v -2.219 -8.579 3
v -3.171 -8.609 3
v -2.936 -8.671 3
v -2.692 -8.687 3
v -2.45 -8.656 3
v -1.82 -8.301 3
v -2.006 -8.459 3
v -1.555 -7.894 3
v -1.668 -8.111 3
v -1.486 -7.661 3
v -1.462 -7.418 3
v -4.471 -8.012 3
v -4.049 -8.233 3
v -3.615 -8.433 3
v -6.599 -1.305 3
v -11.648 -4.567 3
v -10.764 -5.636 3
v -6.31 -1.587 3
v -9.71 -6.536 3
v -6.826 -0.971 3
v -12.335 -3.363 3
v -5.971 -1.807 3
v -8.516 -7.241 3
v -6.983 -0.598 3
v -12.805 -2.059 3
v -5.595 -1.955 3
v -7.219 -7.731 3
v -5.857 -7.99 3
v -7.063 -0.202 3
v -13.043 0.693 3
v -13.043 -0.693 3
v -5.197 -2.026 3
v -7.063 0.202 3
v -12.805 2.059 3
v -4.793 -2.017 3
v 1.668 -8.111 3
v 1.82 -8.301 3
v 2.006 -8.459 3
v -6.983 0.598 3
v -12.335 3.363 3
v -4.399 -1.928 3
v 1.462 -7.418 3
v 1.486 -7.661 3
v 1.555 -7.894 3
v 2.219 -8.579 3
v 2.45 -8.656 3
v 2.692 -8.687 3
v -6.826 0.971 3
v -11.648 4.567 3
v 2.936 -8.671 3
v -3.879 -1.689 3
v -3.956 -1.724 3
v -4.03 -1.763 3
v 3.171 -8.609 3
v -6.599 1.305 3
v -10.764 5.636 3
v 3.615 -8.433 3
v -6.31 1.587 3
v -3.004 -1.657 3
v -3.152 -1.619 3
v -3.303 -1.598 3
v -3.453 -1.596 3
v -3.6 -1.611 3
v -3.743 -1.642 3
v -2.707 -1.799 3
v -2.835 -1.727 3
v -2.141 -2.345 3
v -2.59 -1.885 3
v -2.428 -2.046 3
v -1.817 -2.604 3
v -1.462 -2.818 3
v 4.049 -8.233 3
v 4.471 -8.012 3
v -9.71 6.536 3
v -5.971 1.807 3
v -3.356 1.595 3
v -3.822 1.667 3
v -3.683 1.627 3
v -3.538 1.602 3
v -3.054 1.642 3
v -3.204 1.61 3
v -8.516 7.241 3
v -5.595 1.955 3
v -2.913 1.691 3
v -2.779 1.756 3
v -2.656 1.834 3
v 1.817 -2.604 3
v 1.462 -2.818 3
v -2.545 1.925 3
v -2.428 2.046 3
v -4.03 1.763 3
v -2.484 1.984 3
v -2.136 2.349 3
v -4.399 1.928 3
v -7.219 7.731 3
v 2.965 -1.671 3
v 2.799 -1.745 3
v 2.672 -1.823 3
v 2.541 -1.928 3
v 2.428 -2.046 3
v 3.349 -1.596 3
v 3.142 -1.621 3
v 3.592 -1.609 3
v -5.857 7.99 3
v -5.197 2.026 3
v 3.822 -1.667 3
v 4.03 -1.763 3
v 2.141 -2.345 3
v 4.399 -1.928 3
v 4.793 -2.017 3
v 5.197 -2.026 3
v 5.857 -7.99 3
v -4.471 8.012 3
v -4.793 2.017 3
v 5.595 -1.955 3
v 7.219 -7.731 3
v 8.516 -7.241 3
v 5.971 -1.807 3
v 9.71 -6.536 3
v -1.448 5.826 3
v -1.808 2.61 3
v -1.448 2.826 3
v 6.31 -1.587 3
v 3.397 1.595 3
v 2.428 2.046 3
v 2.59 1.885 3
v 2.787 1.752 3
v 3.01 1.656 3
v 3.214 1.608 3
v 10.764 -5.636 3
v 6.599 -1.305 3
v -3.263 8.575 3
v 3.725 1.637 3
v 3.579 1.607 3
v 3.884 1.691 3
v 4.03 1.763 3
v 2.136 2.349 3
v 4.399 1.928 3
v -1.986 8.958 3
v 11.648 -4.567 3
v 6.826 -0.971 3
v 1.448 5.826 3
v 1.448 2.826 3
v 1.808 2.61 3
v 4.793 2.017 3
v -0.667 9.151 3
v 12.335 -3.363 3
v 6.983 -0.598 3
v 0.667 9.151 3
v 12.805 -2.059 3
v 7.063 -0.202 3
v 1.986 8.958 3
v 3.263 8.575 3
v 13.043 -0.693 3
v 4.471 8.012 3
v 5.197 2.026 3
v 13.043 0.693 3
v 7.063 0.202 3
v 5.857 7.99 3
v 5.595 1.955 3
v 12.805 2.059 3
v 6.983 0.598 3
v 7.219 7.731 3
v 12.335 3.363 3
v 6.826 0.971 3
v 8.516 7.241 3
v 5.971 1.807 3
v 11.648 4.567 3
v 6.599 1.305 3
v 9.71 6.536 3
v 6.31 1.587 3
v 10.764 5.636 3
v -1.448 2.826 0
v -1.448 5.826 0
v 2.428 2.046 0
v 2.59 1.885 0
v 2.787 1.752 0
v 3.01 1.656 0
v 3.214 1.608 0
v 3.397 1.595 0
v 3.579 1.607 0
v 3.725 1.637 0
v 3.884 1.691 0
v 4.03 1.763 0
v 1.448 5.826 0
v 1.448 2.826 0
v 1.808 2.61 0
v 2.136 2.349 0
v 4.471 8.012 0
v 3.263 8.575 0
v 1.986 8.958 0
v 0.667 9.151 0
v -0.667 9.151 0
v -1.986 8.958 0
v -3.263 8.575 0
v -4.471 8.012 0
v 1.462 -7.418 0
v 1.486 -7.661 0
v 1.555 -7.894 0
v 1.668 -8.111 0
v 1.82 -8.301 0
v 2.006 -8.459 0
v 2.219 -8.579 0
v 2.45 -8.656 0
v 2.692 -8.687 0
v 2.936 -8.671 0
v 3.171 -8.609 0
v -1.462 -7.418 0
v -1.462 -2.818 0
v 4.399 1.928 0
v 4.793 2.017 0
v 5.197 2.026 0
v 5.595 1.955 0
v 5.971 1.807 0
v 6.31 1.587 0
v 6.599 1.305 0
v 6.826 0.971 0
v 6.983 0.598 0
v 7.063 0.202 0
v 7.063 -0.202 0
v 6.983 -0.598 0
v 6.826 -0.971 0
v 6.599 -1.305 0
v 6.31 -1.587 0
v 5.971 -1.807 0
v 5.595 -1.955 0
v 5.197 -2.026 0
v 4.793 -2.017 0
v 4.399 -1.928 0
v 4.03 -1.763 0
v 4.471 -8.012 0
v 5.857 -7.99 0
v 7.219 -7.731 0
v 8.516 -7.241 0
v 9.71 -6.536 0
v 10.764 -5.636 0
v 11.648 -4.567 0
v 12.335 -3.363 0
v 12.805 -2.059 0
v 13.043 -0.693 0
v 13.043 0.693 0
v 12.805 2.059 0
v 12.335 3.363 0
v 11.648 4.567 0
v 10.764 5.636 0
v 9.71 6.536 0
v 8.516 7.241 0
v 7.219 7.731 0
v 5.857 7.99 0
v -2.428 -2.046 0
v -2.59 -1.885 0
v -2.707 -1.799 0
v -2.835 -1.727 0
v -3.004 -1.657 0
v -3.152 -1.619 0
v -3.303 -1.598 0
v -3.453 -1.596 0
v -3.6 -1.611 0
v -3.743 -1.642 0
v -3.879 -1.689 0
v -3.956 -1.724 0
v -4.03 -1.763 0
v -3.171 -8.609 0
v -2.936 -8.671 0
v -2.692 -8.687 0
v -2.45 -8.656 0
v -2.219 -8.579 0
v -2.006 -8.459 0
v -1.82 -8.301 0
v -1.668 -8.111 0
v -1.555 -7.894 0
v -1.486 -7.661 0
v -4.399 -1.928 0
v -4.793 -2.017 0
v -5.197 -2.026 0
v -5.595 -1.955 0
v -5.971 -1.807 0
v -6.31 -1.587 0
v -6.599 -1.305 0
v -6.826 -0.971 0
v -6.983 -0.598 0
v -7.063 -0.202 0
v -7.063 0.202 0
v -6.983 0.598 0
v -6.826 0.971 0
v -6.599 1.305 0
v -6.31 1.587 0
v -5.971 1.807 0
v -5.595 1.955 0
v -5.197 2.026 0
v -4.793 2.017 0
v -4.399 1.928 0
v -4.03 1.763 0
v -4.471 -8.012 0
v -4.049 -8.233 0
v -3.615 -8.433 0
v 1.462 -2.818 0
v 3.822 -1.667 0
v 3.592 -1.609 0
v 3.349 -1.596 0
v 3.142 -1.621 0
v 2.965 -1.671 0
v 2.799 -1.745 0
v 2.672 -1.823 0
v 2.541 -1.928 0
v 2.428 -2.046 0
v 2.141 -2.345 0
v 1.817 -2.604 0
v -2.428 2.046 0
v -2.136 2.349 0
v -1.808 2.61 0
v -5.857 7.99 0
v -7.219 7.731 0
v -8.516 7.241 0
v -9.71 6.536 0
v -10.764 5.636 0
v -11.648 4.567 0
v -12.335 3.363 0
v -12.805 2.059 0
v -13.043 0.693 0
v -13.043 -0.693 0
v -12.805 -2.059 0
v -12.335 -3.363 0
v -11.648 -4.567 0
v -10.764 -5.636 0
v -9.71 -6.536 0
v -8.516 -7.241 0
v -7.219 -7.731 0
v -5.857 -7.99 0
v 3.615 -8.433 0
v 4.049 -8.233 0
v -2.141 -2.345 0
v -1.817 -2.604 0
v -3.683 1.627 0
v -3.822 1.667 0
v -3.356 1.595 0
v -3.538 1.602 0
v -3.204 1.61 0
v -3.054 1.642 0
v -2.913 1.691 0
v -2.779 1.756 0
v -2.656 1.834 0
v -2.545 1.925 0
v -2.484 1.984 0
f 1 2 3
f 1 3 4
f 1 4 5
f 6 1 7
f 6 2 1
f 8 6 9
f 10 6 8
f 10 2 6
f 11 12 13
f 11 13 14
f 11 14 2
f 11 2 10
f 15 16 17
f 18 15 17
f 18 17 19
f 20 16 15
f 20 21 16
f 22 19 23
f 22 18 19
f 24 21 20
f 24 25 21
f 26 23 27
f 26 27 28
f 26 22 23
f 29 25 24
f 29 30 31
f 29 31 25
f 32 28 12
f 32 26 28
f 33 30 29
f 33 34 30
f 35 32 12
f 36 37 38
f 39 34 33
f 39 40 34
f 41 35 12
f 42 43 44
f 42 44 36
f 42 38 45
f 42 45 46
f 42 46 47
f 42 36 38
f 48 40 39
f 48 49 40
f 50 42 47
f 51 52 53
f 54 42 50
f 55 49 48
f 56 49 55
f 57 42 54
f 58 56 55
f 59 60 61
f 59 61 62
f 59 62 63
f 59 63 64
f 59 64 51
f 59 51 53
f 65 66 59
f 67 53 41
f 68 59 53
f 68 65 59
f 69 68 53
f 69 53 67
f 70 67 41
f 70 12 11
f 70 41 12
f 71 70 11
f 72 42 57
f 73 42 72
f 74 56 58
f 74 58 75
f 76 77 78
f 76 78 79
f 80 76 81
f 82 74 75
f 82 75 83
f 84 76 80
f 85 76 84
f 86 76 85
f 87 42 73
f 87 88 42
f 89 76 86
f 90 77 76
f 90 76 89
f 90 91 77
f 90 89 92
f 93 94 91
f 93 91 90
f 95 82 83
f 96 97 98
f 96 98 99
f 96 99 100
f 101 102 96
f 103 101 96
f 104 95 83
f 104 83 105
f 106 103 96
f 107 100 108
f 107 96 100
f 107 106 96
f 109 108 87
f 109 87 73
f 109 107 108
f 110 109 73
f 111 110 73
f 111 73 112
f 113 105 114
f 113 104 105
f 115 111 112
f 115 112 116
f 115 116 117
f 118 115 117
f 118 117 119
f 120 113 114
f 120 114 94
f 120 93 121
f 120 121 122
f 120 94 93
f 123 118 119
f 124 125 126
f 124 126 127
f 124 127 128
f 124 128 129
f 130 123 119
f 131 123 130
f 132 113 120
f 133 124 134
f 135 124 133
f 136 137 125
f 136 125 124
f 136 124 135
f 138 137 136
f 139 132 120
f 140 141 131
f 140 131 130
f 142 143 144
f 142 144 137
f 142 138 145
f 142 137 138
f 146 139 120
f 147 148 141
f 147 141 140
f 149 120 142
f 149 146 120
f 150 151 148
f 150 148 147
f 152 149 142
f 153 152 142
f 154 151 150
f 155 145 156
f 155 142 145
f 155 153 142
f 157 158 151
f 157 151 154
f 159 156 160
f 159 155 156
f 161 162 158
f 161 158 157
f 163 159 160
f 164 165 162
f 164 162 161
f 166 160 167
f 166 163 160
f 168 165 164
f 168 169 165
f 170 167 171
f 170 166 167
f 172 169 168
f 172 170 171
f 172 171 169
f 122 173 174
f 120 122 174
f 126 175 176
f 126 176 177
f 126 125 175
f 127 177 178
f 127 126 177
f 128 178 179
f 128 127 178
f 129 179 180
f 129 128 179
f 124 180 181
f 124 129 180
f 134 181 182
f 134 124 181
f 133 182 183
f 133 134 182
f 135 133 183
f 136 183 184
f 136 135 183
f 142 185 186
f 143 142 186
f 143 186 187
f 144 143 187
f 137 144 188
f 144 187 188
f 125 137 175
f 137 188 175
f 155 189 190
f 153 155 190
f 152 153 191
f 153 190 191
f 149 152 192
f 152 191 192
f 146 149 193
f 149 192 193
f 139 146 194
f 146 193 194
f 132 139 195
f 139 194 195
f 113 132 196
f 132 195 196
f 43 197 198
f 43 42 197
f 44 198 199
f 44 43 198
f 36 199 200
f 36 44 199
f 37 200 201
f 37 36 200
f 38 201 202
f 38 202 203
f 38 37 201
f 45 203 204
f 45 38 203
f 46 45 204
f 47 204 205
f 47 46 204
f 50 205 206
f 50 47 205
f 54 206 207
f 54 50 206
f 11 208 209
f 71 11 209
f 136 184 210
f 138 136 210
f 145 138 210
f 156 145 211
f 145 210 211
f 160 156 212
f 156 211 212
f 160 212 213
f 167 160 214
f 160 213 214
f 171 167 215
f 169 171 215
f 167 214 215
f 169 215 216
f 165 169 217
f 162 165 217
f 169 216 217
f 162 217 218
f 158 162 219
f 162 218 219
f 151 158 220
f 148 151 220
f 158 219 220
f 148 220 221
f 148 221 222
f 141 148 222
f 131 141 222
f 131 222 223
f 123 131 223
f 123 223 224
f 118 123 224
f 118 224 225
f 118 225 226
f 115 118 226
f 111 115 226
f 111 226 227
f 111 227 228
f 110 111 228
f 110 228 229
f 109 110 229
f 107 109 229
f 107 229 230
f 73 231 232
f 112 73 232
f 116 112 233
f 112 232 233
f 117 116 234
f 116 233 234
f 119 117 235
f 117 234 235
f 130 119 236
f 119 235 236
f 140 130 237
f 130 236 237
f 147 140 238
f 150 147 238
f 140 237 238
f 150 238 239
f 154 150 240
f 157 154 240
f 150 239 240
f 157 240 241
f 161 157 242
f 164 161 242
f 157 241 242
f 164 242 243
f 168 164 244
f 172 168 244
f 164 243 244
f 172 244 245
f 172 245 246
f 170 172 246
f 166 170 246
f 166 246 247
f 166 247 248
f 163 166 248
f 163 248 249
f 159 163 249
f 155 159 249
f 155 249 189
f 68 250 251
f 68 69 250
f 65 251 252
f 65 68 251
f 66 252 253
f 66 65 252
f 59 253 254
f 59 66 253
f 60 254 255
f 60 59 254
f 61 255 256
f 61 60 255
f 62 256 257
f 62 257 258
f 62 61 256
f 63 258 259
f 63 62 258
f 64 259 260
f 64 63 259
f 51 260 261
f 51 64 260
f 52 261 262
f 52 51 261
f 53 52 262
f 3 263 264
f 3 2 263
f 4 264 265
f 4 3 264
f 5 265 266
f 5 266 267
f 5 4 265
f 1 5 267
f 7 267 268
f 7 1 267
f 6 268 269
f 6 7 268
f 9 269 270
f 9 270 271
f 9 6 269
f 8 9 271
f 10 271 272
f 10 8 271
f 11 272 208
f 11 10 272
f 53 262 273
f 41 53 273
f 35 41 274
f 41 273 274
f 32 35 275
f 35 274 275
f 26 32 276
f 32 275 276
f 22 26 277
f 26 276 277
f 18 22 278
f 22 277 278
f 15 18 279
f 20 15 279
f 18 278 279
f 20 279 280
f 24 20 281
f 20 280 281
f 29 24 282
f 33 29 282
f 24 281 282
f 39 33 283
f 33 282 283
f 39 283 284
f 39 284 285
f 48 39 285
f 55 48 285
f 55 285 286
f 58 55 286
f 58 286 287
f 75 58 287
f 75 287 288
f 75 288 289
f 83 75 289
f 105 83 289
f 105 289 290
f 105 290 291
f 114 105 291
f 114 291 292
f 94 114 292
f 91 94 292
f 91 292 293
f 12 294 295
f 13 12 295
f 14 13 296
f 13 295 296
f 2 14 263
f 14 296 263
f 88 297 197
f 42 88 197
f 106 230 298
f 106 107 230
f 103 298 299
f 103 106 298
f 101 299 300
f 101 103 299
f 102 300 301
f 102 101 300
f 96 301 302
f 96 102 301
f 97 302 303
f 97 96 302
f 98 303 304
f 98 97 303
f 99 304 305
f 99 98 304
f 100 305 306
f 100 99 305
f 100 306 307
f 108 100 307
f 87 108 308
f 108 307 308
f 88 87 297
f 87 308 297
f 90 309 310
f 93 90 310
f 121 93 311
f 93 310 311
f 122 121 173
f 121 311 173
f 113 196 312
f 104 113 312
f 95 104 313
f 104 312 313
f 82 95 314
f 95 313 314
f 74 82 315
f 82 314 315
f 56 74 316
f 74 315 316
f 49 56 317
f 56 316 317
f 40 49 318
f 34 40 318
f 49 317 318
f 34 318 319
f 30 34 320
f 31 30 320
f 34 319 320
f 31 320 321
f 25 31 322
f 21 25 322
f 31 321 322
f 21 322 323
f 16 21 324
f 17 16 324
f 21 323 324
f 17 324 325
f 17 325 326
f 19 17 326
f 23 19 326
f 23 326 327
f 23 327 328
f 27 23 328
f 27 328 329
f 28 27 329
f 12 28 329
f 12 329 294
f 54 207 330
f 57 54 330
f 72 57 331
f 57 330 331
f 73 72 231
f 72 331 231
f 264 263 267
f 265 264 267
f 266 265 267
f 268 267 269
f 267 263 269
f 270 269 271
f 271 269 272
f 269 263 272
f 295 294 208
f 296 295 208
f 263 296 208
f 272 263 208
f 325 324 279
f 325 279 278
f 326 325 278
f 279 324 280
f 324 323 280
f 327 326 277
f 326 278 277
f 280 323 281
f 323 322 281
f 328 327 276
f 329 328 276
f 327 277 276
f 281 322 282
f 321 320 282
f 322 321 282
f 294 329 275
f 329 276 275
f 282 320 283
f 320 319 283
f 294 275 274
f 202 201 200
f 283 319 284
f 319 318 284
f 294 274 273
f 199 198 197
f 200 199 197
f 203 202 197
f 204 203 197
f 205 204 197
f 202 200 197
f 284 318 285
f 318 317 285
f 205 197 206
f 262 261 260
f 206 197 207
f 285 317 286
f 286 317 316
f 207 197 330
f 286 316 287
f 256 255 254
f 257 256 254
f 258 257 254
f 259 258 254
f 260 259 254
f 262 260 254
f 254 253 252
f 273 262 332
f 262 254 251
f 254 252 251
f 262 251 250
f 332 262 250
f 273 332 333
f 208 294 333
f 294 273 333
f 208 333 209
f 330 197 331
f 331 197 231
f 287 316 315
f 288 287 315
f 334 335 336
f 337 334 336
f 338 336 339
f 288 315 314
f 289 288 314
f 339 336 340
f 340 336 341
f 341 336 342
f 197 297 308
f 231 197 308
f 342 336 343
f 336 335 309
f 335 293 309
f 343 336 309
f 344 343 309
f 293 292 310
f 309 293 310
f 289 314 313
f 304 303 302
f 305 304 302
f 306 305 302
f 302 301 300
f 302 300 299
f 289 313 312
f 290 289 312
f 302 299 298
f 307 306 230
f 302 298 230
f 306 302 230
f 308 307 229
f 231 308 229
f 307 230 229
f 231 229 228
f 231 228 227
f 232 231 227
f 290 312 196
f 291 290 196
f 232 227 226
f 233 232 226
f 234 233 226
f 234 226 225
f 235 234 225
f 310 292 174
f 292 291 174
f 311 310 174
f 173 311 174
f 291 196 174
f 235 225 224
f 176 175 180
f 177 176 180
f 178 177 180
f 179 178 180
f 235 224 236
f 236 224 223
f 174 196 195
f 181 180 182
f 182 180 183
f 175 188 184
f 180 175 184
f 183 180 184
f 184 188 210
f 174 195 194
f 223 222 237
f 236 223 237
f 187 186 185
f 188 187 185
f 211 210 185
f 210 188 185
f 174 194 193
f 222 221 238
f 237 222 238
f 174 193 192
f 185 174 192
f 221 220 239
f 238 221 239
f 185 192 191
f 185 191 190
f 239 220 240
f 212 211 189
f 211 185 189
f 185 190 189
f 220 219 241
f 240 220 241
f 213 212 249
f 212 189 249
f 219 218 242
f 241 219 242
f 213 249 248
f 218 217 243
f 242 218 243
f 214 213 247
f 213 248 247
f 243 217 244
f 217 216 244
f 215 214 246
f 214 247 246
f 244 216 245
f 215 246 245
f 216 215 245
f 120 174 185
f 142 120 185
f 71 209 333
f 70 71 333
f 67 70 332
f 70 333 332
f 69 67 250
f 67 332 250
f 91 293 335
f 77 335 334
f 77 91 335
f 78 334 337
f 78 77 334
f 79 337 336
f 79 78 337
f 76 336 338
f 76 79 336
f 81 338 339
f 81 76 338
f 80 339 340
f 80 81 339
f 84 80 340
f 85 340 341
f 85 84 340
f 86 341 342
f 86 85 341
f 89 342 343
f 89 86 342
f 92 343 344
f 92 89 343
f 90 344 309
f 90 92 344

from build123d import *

# Parameters (mm, degrees)
EXTRUDE_1_DEPTH = 3
FILLET_1_R      = 1.27


with BuildPart() as part:
    # 스케치1 → 보스-돌출1 (new body)
    with BuildSketch(Plane.XY):
        with BuildLine():
            Line((-1.4475, 5.825839477), (1.4475, 5.825839477))
            Line((1.4475, 5.825839477), (1.4475, 2.825839477))
            ThreePointArc((1.4475, 2.825839477), (2.528752179, 1.919905575), (3.110851973, 0.635))
            ThreePointArc((3.110851973, 0.635), (7.073084861, 0), (3.110851973, -0.635))
            ThreePointArc((3.110851973, -0.635), (2.533845793, -1.913178115), (1.4625, -2.818105525))
            Line((1.4625, -2.818105525), (1.4625, -9.057688378))
            ThreePointArc((1.4625, -9.057688378), (3.012624602, -8.666297826), (4.471273428, -8.011762536))
            ThreePointArc((4.471273428, -8.011762536), (13.073084861, 0), (4.471273428, 8.011762536))
            ThreePointArc((4.471273428, 8.011762536), (0, 9.175), (-4.471273428, 8.011762536))
            ThreePointArc((-4.471273428, 8.011762536), (-13.073084861, 0), (-4.471273428, -8.011762536))
            ThreePointArc((-4.471273428, -8.011762536), (-3.012624602, -8.666297826), (-1.4625, -9.057688378))
            Line((-1.4625, -9.057688378), (-1.4625, -2.818105525))
            ThreePointArc((-1.4625, -2.818105525), (-2.533845793, -1.913178115), (-3.110851973, -0.635))
            ThreePointArc((-3.110851973, -0.635), (-7.073084861, 0), (-3.110851973, 0.635))
            ThreePointArc((-3.110851973, 0.635), (-2.528752179, 1.919905575), (-1.4475, 2.825839477))
            Line((-1.4475, 2.825839477), (-1.4475, 5.825839477))
        make_face()
    extrude(amount=EXTRUDE_1_DEPTH)

    # 필렛1
    fillet_1_edges = [part.edges().sort_by_distance(p)[0] for p in [
        (-3.110851973, 0.635, 1.5),
        (-3.110851973, -0.635, 1.5),
        (-1.4625, -9.057688378, 1.5),
        (1.4625, -9.057688378, 1.5),
        (3.110851973, -0.635, 1.5),
        (3.110851973, 0.635, 1.5),
    ]]
    fillet(fillet_1_edges, radius=FILLET_1_R)


solid = part.part
